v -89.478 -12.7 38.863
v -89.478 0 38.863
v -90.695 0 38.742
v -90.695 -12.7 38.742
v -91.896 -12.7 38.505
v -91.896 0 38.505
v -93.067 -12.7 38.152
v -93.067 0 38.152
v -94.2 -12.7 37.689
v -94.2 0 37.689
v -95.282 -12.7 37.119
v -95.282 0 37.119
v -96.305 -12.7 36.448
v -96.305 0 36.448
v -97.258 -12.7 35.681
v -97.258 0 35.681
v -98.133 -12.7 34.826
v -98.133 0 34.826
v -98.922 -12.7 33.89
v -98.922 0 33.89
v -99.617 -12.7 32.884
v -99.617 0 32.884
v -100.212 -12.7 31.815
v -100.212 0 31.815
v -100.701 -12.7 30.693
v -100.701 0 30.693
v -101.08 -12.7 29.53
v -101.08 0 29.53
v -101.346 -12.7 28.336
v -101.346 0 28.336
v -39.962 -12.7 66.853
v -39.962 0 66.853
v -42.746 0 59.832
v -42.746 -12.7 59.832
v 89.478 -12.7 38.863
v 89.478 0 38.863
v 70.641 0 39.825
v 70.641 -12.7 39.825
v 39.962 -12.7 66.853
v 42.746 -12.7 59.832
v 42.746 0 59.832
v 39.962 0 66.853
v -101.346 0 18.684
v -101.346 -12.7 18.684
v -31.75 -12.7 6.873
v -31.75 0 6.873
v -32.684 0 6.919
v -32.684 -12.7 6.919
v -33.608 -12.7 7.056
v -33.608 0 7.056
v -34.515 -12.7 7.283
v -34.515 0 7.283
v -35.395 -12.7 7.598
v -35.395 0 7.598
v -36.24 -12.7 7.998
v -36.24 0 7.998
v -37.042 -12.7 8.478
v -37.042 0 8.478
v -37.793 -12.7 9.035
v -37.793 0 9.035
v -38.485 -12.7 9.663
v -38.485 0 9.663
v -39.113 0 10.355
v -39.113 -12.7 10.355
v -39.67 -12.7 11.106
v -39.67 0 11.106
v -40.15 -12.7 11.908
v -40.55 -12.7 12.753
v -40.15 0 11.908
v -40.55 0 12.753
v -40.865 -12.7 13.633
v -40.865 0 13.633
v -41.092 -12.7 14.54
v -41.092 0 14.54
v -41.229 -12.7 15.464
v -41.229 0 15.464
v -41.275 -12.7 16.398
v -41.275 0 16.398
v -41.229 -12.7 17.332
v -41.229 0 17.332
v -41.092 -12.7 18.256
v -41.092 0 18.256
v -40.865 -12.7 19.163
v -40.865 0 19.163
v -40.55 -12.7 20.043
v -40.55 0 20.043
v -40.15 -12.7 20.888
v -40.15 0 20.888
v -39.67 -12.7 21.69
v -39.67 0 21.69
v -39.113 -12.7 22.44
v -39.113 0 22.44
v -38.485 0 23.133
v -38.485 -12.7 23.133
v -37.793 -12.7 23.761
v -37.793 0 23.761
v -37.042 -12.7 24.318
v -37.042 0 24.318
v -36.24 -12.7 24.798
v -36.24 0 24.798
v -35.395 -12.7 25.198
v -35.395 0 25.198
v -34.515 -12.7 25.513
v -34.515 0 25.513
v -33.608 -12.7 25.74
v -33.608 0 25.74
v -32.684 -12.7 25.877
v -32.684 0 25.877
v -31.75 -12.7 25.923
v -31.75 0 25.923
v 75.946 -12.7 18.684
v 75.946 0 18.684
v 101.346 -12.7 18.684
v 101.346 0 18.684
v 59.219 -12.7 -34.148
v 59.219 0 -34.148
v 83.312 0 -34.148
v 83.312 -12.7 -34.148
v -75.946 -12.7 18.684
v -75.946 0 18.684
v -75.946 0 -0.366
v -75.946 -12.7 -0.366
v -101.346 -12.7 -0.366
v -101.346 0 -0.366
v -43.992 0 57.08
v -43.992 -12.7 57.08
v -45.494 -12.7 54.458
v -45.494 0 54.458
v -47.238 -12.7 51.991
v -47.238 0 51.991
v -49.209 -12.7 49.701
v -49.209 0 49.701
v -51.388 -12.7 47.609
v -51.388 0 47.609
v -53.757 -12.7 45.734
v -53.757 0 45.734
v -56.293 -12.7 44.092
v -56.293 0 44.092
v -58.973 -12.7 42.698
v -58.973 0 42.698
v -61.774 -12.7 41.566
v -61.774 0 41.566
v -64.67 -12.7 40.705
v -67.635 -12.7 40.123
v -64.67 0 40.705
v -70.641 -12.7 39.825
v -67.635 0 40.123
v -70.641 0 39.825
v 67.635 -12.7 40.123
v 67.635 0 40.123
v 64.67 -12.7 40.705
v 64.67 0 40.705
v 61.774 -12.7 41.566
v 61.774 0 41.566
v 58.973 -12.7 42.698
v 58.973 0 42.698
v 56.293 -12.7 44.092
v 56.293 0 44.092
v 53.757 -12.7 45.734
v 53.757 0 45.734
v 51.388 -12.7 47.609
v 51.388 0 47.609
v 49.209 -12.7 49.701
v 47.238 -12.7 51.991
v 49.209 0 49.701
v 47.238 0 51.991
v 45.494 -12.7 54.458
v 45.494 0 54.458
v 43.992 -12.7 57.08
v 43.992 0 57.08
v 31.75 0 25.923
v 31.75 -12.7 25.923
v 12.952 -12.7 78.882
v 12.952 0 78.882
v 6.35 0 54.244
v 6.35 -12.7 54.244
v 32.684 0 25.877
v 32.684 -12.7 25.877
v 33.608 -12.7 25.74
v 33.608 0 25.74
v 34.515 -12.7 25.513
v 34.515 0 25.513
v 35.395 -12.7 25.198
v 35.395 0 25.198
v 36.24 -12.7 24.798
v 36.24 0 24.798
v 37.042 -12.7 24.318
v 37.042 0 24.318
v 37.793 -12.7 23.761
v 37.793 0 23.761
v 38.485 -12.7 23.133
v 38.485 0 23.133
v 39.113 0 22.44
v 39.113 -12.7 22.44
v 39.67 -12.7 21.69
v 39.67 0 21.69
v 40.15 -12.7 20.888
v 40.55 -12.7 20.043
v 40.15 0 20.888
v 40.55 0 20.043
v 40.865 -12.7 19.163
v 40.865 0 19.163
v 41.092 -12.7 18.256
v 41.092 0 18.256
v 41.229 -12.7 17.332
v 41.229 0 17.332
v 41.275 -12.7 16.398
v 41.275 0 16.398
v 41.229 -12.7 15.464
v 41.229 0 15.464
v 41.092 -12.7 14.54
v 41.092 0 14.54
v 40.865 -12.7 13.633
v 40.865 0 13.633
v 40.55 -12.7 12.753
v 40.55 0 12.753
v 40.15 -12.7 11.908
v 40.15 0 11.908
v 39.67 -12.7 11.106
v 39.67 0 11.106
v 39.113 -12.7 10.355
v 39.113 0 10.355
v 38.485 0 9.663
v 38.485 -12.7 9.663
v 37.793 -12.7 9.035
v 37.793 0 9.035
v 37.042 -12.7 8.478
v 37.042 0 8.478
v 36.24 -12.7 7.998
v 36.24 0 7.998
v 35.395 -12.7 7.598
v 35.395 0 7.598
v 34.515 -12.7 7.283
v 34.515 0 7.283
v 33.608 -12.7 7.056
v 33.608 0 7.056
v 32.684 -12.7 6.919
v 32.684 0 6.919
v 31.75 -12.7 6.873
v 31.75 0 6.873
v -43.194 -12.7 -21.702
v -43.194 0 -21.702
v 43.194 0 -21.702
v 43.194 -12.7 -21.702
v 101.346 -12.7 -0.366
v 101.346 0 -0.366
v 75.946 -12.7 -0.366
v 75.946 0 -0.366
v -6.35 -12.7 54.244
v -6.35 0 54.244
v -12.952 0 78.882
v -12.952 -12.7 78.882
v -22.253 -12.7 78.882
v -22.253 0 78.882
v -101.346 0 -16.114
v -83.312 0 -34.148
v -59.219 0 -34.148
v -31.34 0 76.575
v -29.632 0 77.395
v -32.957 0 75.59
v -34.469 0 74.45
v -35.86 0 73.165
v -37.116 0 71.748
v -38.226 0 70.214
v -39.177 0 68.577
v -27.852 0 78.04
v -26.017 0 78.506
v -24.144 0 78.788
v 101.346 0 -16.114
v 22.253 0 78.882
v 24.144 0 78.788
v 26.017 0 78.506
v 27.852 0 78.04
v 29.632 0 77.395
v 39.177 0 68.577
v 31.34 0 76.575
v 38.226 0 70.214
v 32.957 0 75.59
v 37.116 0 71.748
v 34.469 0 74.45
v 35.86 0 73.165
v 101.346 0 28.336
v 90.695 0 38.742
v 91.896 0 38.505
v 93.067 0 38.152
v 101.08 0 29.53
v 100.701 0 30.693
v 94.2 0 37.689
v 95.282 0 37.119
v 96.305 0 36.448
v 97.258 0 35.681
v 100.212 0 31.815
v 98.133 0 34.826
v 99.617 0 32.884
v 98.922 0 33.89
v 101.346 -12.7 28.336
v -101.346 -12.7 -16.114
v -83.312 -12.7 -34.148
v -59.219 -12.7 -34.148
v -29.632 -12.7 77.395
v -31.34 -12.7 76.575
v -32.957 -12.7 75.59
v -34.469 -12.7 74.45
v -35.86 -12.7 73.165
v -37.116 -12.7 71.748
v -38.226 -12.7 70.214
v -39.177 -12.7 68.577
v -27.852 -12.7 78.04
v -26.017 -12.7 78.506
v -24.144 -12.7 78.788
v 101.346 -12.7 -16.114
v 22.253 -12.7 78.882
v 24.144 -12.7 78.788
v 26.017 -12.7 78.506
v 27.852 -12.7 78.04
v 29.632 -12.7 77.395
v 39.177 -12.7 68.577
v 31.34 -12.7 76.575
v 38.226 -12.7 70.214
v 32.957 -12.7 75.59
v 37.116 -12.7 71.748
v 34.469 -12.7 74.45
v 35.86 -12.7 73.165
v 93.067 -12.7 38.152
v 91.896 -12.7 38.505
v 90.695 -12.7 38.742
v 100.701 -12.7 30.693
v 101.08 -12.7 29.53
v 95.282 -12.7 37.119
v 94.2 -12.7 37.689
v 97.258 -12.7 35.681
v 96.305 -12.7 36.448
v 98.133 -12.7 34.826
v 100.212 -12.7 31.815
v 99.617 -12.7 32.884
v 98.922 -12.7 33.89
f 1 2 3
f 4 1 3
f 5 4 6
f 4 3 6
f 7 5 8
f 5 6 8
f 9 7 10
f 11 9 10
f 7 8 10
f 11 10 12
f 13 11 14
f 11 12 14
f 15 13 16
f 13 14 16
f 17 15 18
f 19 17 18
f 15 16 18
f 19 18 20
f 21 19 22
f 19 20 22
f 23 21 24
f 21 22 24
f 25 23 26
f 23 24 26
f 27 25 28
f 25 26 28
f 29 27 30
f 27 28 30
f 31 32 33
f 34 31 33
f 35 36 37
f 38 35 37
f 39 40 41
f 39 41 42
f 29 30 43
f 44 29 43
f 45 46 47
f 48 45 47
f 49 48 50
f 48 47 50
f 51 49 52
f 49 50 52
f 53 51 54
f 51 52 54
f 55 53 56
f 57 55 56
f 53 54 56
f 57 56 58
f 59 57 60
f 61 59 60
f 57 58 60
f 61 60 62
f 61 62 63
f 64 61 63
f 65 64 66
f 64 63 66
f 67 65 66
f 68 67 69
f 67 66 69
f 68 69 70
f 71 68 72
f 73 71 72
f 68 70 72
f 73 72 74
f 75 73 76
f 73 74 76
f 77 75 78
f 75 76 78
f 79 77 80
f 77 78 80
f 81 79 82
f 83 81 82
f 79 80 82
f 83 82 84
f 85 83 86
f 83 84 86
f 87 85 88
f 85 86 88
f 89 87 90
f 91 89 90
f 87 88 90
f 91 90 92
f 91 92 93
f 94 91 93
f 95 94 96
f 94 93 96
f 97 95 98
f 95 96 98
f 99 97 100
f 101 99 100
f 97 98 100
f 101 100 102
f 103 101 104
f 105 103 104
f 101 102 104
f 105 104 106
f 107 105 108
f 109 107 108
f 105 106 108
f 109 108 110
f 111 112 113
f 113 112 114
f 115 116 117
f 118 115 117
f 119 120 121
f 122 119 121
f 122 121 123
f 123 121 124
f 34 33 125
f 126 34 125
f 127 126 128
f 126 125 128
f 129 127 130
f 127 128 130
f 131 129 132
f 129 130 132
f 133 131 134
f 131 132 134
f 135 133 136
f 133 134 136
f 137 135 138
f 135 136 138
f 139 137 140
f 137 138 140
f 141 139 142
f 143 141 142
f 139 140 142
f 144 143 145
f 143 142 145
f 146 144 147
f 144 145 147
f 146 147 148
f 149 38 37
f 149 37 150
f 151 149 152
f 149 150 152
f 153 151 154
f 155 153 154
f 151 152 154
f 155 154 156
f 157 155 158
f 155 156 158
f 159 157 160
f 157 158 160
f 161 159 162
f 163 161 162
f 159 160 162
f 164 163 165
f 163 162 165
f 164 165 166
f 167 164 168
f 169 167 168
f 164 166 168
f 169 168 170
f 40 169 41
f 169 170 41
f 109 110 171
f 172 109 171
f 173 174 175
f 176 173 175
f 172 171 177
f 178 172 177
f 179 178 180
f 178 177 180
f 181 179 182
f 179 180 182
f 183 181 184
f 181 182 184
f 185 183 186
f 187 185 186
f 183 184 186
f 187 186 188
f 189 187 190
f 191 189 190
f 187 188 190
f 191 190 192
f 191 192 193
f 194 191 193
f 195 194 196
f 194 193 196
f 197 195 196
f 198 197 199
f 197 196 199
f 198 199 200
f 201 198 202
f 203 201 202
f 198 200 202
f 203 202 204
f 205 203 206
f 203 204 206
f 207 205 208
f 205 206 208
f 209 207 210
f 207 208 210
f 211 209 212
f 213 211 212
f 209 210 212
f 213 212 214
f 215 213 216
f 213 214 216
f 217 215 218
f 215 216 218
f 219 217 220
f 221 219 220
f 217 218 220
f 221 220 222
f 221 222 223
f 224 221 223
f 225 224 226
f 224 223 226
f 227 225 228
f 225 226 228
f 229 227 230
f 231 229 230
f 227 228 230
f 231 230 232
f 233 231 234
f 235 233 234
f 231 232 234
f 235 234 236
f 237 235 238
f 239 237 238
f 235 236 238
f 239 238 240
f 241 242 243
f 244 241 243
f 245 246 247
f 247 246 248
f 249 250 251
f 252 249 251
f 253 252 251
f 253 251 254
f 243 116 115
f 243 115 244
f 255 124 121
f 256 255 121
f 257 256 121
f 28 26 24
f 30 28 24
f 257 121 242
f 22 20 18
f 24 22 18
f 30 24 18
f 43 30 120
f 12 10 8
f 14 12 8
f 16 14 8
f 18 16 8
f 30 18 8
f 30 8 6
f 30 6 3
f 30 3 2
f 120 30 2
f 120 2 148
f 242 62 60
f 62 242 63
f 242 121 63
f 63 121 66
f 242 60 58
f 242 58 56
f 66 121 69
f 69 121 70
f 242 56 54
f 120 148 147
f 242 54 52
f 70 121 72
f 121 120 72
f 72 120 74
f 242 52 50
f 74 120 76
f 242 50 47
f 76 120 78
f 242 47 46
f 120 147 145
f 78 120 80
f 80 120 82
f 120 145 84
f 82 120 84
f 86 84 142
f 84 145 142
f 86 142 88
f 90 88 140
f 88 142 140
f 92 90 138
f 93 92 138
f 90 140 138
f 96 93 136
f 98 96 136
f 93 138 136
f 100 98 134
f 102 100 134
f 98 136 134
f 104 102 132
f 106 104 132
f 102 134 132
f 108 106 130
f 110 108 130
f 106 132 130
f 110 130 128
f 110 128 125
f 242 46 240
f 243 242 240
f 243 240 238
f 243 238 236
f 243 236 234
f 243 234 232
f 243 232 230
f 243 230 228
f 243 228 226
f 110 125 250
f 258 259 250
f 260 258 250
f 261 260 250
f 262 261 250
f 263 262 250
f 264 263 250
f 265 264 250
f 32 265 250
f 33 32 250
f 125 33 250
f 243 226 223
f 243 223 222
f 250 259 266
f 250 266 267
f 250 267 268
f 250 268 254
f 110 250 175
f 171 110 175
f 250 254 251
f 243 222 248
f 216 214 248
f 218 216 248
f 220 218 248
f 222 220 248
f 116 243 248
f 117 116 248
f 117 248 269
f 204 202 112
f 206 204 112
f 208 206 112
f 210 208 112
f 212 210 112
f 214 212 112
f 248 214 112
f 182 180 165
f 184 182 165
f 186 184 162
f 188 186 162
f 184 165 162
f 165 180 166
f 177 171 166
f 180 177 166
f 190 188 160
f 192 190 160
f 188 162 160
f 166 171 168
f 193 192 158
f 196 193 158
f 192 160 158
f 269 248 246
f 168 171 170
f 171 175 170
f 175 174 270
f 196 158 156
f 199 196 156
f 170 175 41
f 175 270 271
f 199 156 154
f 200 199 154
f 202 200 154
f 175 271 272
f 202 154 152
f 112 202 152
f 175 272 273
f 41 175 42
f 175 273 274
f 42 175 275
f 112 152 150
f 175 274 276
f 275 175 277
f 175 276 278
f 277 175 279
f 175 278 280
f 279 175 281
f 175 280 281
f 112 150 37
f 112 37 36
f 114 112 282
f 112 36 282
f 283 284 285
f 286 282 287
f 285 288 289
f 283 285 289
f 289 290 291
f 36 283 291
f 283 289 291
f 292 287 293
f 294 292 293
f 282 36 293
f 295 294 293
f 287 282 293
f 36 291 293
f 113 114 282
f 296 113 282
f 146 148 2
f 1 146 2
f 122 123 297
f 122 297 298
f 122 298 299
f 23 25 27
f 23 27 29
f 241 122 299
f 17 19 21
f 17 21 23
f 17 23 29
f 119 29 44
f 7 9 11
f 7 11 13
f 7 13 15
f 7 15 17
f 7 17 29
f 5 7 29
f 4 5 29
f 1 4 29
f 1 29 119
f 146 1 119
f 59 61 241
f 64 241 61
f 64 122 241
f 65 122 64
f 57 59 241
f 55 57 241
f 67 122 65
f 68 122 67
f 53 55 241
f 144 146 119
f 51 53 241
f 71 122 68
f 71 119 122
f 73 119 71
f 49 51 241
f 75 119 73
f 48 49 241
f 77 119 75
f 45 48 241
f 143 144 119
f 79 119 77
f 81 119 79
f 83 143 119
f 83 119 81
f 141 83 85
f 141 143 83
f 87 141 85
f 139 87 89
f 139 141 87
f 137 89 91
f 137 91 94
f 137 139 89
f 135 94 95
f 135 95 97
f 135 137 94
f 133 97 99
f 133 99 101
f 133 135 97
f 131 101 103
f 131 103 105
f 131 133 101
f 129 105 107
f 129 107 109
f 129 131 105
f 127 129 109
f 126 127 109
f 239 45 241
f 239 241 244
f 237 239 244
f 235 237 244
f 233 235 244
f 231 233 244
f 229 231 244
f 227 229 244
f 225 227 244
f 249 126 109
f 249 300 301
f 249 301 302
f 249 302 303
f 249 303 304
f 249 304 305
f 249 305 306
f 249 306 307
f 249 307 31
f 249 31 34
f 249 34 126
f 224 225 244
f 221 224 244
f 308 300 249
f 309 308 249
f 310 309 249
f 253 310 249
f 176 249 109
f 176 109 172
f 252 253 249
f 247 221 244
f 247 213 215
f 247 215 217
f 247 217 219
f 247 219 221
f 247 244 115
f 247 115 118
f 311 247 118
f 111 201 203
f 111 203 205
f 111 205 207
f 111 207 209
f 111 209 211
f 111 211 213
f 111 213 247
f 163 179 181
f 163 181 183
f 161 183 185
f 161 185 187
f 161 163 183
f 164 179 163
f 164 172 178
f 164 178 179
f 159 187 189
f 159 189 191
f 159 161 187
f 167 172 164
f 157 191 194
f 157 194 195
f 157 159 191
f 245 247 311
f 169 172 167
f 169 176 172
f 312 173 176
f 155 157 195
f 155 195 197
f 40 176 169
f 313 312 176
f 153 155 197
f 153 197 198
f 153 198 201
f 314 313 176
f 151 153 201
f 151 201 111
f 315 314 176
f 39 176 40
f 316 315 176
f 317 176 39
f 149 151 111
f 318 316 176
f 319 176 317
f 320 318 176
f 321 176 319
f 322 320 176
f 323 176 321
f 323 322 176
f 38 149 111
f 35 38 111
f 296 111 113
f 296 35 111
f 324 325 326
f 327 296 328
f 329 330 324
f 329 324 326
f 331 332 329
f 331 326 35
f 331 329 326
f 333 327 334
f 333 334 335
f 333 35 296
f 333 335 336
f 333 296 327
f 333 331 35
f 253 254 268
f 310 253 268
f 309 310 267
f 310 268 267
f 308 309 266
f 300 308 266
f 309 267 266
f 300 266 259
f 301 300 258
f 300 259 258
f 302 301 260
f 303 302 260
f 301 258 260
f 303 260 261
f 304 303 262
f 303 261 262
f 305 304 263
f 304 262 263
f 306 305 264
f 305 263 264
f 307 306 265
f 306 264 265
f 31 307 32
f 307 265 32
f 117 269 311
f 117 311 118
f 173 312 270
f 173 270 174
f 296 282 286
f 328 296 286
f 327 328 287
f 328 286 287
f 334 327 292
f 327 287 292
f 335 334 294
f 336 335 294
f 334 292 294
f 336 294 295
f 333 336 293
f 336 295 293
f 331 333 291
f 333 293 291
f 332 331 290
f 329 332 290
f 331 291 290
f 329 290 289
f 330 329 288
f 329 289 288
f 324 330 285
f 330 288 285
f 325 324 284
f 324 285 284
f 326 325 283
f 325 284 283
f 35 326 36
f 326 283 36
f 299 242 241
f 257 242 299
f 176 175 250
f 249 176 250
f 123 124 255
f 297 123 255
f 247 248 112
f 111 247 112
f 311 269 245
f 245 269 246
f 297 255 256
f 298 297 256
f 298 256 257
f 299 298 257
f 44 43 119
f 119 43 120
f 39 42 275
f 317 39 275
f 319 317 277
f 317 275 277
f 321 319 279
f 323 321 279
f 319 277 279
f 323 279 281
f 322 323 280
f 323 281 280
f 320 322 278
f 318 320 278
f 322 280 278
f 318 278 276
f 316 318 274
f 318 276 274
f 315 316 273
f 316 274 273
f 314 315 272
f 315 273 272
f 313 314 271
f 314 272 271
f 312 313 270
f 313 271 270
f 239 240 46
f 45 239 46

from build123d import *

# Parameters (mm, degrees)
F1_DEPTH     = 12.7
F2_T1_DEPTH  = 105.45546201
F2_T6_DEPTH  = 85.6153780659
F2_T11_DEPTH = 85.6153780659


# Not quite as in the source:
# - a fillet or chamfer that OpenCascade refuses, or shapes differently, is made with other operations: its cross-section is extruded or revolved along the edge and cut away or added


with BuildPart() as f1:
    # F0 (on Front) → F1 (new body)
    with BuildSketch(Plane.XZ):
        with BuildLine():
            Line((6.35, 54.2438933111), (-6.35, 54.2438933111))
            Line((-6.35, 54.2438933111), (-12.9517322031, 78.8818933111))
            Line((-12.9517322031, 78.8818933111), (-22.2531325433, 78.8818933111))
            ThreePointArc((-22.2531325433, 78.8818933111), (-32.9570059401, 75.5903702142), (-39.961976816, 66.8532417945))
            Line((-39.961976816, 66.8532417945), (-42.7458589128, 59.8318933111))
            ThreePointArc((-42.7458589128, 59.8318933111), (-53.7566077671, 45.7336602674), (-70.6412160864, 39.8254653493))
            Line((-70.6412160864, 39.8254653493), (-89.4780809568, 38.8634540506))
            ThreePointArc((-89.4780809568, 38.8634540506), (-97.258039529, 35.6807034492), (-101.346, 28.3358933111))
            Line((-101.346, 28.3358933111), (-101.346, 18.6838933111))
            Line((-101.346, 18.6838933111), (-75.946, 18.6838933111))
            Line((-75.946, 18.6838933111), (-75.946, -0.3661066889))
            Line((-75.946, -0.3661066889), (-101.346, -0.3661066889))
            Line((-101.346, -0.3661066889), (-101.346, -34.1481066889))
            Line((-101.346, -34.1481066889), (-45.212, -34.1481066889))
            Line((-45.212, -34.1481066889), (-42.0329745032, -21.7021066889))
            Line((-42.0329745032, -21.7021066889), (0, -21.7021066889))
            Line((0, -21.7021066889), (42.0329745032, -21.7021066889))
            Line((42.0329745032, -21.7021066889), (45.212, -34.1481066889))
            Line((45.212, -34.1481066889), (101.346, -34.1481066889))
            Line((101.346, -34.1481066889), (101.346, -0.3661066889))
            Line((101.346, -0.3661066889), (75.946, -0.3661066889))
            Line((75.946, -0.3661066889), (75.946, 18.6838933111))
            Line((75.946, 18.6838933111), (101.346, 18.6838933111))
            Line((101.346, 18.6838933111), (101.346, 28.3358933111))
            ThreePointArc((101.346, 28.3358933111), (97.258039529, 35.6807034492), (89.4780809568, 38.8634540506))
            Line((89.4780809568, 38.8634540506), (70.6412160864, 39.8254653493))
            ThreePointArc((70.6412160864, 39.8254653493), (53.7566077671, 45.7336602674), (42.7458589128, 59.8318933111))
            Line((42.7458589128, 59.8318933111), (39.961976816, 66.8532417945))
            ThreePointArc((39.961976816, 66.8532417945), (32.9570059401, 75.5903702142), (22.2531325433, 78.8818933111))
            Line((22.2531325433, 78.8818933111), (12.9517322031, 78.8818933111))
            Line((12.9517322031, 78.8818933111), (6.35, 54.2438933111))
        make_face()
        with BuildLine():
            ThreePointArc((-31.75, 6.8728933111), (-41.275, 16.3978933111), (-31.75, 25.9228933111))
            Line((-31.75, 25.9228933111), (31.75, 25.9228933111))
            ThreePointArc((31.75, 25.9228933111), (41.275, 16.3978933111), (31.75, 6.8728933111))
            Line((31.75, 6.8728933111), (-31.75, 6.8728933111))
        make_face(mode=Mode.SUBTRACT)
    extrude(amount=F1_DEPTH)

    # F2: chamfer of 18.034 on 4 edges, made by hand

    # F2_s2 → F2_t1 (cut)
    with BuildSketch(Plane.XZ.offset(-46.377731005)):
        Polygon((-101.346, -16.1141066889), (-83.312, -34.1481066889), (-101.346, -34.1481066889), align=None)
        Polygon((101.346, -16.1141066889), (83.312, -34.1481066889), (101.346, -34.1481066889), align=None)
    extrude(amount=F2_T1_DEPTH, mode=Mode.SUBTRACT)


with BuildPart() as f2_tool4:
    # F2_s5 → F2_t6 (new body)
    with BuildSketch(Plane.XZ.offset(-36.4576890329)):
        Polygon((-41.7456345338, -20.5771602982), (-59.218651116, -34.1481066889), (-45.212, -34.1481066889), align=None)
    extrude(amount=F2_T6_DEPTH)

    split(bisect_by=Plane.XY.offset(-21.7021066889), keep=Keep.BOTTOM)


with BuildPart() as f1_1:
    add(f1.part)

    # F2_t3: cut F2_tool4
    add(f2_tool4.part, mode=Mode.SUBTRACT)


with BuildPart() as f2_tool9:
    # F2_s10 → F2_t11 (new body)
    with BuildSketch(Plane.XZ.offset(-36.4576890329)):
        Polygon((59.218651116, -34.1481066889), (41.7456345338, -20.5771602982), (45.212, -34.1481066889), align=None)
    extrude(amount=F2_T11_DEPTH)

    split(bisect_by=Plane.XY.offset(-21.7021066889), keep=Keep.BOTTOM)


with BuildPart() as f1_2:
    add(f1_1.part)

    # F2_t8: cut F2_tool9
    add(f2_tool9.part, mode=Mode.SUBTRACT)


solid = f1_2.part
